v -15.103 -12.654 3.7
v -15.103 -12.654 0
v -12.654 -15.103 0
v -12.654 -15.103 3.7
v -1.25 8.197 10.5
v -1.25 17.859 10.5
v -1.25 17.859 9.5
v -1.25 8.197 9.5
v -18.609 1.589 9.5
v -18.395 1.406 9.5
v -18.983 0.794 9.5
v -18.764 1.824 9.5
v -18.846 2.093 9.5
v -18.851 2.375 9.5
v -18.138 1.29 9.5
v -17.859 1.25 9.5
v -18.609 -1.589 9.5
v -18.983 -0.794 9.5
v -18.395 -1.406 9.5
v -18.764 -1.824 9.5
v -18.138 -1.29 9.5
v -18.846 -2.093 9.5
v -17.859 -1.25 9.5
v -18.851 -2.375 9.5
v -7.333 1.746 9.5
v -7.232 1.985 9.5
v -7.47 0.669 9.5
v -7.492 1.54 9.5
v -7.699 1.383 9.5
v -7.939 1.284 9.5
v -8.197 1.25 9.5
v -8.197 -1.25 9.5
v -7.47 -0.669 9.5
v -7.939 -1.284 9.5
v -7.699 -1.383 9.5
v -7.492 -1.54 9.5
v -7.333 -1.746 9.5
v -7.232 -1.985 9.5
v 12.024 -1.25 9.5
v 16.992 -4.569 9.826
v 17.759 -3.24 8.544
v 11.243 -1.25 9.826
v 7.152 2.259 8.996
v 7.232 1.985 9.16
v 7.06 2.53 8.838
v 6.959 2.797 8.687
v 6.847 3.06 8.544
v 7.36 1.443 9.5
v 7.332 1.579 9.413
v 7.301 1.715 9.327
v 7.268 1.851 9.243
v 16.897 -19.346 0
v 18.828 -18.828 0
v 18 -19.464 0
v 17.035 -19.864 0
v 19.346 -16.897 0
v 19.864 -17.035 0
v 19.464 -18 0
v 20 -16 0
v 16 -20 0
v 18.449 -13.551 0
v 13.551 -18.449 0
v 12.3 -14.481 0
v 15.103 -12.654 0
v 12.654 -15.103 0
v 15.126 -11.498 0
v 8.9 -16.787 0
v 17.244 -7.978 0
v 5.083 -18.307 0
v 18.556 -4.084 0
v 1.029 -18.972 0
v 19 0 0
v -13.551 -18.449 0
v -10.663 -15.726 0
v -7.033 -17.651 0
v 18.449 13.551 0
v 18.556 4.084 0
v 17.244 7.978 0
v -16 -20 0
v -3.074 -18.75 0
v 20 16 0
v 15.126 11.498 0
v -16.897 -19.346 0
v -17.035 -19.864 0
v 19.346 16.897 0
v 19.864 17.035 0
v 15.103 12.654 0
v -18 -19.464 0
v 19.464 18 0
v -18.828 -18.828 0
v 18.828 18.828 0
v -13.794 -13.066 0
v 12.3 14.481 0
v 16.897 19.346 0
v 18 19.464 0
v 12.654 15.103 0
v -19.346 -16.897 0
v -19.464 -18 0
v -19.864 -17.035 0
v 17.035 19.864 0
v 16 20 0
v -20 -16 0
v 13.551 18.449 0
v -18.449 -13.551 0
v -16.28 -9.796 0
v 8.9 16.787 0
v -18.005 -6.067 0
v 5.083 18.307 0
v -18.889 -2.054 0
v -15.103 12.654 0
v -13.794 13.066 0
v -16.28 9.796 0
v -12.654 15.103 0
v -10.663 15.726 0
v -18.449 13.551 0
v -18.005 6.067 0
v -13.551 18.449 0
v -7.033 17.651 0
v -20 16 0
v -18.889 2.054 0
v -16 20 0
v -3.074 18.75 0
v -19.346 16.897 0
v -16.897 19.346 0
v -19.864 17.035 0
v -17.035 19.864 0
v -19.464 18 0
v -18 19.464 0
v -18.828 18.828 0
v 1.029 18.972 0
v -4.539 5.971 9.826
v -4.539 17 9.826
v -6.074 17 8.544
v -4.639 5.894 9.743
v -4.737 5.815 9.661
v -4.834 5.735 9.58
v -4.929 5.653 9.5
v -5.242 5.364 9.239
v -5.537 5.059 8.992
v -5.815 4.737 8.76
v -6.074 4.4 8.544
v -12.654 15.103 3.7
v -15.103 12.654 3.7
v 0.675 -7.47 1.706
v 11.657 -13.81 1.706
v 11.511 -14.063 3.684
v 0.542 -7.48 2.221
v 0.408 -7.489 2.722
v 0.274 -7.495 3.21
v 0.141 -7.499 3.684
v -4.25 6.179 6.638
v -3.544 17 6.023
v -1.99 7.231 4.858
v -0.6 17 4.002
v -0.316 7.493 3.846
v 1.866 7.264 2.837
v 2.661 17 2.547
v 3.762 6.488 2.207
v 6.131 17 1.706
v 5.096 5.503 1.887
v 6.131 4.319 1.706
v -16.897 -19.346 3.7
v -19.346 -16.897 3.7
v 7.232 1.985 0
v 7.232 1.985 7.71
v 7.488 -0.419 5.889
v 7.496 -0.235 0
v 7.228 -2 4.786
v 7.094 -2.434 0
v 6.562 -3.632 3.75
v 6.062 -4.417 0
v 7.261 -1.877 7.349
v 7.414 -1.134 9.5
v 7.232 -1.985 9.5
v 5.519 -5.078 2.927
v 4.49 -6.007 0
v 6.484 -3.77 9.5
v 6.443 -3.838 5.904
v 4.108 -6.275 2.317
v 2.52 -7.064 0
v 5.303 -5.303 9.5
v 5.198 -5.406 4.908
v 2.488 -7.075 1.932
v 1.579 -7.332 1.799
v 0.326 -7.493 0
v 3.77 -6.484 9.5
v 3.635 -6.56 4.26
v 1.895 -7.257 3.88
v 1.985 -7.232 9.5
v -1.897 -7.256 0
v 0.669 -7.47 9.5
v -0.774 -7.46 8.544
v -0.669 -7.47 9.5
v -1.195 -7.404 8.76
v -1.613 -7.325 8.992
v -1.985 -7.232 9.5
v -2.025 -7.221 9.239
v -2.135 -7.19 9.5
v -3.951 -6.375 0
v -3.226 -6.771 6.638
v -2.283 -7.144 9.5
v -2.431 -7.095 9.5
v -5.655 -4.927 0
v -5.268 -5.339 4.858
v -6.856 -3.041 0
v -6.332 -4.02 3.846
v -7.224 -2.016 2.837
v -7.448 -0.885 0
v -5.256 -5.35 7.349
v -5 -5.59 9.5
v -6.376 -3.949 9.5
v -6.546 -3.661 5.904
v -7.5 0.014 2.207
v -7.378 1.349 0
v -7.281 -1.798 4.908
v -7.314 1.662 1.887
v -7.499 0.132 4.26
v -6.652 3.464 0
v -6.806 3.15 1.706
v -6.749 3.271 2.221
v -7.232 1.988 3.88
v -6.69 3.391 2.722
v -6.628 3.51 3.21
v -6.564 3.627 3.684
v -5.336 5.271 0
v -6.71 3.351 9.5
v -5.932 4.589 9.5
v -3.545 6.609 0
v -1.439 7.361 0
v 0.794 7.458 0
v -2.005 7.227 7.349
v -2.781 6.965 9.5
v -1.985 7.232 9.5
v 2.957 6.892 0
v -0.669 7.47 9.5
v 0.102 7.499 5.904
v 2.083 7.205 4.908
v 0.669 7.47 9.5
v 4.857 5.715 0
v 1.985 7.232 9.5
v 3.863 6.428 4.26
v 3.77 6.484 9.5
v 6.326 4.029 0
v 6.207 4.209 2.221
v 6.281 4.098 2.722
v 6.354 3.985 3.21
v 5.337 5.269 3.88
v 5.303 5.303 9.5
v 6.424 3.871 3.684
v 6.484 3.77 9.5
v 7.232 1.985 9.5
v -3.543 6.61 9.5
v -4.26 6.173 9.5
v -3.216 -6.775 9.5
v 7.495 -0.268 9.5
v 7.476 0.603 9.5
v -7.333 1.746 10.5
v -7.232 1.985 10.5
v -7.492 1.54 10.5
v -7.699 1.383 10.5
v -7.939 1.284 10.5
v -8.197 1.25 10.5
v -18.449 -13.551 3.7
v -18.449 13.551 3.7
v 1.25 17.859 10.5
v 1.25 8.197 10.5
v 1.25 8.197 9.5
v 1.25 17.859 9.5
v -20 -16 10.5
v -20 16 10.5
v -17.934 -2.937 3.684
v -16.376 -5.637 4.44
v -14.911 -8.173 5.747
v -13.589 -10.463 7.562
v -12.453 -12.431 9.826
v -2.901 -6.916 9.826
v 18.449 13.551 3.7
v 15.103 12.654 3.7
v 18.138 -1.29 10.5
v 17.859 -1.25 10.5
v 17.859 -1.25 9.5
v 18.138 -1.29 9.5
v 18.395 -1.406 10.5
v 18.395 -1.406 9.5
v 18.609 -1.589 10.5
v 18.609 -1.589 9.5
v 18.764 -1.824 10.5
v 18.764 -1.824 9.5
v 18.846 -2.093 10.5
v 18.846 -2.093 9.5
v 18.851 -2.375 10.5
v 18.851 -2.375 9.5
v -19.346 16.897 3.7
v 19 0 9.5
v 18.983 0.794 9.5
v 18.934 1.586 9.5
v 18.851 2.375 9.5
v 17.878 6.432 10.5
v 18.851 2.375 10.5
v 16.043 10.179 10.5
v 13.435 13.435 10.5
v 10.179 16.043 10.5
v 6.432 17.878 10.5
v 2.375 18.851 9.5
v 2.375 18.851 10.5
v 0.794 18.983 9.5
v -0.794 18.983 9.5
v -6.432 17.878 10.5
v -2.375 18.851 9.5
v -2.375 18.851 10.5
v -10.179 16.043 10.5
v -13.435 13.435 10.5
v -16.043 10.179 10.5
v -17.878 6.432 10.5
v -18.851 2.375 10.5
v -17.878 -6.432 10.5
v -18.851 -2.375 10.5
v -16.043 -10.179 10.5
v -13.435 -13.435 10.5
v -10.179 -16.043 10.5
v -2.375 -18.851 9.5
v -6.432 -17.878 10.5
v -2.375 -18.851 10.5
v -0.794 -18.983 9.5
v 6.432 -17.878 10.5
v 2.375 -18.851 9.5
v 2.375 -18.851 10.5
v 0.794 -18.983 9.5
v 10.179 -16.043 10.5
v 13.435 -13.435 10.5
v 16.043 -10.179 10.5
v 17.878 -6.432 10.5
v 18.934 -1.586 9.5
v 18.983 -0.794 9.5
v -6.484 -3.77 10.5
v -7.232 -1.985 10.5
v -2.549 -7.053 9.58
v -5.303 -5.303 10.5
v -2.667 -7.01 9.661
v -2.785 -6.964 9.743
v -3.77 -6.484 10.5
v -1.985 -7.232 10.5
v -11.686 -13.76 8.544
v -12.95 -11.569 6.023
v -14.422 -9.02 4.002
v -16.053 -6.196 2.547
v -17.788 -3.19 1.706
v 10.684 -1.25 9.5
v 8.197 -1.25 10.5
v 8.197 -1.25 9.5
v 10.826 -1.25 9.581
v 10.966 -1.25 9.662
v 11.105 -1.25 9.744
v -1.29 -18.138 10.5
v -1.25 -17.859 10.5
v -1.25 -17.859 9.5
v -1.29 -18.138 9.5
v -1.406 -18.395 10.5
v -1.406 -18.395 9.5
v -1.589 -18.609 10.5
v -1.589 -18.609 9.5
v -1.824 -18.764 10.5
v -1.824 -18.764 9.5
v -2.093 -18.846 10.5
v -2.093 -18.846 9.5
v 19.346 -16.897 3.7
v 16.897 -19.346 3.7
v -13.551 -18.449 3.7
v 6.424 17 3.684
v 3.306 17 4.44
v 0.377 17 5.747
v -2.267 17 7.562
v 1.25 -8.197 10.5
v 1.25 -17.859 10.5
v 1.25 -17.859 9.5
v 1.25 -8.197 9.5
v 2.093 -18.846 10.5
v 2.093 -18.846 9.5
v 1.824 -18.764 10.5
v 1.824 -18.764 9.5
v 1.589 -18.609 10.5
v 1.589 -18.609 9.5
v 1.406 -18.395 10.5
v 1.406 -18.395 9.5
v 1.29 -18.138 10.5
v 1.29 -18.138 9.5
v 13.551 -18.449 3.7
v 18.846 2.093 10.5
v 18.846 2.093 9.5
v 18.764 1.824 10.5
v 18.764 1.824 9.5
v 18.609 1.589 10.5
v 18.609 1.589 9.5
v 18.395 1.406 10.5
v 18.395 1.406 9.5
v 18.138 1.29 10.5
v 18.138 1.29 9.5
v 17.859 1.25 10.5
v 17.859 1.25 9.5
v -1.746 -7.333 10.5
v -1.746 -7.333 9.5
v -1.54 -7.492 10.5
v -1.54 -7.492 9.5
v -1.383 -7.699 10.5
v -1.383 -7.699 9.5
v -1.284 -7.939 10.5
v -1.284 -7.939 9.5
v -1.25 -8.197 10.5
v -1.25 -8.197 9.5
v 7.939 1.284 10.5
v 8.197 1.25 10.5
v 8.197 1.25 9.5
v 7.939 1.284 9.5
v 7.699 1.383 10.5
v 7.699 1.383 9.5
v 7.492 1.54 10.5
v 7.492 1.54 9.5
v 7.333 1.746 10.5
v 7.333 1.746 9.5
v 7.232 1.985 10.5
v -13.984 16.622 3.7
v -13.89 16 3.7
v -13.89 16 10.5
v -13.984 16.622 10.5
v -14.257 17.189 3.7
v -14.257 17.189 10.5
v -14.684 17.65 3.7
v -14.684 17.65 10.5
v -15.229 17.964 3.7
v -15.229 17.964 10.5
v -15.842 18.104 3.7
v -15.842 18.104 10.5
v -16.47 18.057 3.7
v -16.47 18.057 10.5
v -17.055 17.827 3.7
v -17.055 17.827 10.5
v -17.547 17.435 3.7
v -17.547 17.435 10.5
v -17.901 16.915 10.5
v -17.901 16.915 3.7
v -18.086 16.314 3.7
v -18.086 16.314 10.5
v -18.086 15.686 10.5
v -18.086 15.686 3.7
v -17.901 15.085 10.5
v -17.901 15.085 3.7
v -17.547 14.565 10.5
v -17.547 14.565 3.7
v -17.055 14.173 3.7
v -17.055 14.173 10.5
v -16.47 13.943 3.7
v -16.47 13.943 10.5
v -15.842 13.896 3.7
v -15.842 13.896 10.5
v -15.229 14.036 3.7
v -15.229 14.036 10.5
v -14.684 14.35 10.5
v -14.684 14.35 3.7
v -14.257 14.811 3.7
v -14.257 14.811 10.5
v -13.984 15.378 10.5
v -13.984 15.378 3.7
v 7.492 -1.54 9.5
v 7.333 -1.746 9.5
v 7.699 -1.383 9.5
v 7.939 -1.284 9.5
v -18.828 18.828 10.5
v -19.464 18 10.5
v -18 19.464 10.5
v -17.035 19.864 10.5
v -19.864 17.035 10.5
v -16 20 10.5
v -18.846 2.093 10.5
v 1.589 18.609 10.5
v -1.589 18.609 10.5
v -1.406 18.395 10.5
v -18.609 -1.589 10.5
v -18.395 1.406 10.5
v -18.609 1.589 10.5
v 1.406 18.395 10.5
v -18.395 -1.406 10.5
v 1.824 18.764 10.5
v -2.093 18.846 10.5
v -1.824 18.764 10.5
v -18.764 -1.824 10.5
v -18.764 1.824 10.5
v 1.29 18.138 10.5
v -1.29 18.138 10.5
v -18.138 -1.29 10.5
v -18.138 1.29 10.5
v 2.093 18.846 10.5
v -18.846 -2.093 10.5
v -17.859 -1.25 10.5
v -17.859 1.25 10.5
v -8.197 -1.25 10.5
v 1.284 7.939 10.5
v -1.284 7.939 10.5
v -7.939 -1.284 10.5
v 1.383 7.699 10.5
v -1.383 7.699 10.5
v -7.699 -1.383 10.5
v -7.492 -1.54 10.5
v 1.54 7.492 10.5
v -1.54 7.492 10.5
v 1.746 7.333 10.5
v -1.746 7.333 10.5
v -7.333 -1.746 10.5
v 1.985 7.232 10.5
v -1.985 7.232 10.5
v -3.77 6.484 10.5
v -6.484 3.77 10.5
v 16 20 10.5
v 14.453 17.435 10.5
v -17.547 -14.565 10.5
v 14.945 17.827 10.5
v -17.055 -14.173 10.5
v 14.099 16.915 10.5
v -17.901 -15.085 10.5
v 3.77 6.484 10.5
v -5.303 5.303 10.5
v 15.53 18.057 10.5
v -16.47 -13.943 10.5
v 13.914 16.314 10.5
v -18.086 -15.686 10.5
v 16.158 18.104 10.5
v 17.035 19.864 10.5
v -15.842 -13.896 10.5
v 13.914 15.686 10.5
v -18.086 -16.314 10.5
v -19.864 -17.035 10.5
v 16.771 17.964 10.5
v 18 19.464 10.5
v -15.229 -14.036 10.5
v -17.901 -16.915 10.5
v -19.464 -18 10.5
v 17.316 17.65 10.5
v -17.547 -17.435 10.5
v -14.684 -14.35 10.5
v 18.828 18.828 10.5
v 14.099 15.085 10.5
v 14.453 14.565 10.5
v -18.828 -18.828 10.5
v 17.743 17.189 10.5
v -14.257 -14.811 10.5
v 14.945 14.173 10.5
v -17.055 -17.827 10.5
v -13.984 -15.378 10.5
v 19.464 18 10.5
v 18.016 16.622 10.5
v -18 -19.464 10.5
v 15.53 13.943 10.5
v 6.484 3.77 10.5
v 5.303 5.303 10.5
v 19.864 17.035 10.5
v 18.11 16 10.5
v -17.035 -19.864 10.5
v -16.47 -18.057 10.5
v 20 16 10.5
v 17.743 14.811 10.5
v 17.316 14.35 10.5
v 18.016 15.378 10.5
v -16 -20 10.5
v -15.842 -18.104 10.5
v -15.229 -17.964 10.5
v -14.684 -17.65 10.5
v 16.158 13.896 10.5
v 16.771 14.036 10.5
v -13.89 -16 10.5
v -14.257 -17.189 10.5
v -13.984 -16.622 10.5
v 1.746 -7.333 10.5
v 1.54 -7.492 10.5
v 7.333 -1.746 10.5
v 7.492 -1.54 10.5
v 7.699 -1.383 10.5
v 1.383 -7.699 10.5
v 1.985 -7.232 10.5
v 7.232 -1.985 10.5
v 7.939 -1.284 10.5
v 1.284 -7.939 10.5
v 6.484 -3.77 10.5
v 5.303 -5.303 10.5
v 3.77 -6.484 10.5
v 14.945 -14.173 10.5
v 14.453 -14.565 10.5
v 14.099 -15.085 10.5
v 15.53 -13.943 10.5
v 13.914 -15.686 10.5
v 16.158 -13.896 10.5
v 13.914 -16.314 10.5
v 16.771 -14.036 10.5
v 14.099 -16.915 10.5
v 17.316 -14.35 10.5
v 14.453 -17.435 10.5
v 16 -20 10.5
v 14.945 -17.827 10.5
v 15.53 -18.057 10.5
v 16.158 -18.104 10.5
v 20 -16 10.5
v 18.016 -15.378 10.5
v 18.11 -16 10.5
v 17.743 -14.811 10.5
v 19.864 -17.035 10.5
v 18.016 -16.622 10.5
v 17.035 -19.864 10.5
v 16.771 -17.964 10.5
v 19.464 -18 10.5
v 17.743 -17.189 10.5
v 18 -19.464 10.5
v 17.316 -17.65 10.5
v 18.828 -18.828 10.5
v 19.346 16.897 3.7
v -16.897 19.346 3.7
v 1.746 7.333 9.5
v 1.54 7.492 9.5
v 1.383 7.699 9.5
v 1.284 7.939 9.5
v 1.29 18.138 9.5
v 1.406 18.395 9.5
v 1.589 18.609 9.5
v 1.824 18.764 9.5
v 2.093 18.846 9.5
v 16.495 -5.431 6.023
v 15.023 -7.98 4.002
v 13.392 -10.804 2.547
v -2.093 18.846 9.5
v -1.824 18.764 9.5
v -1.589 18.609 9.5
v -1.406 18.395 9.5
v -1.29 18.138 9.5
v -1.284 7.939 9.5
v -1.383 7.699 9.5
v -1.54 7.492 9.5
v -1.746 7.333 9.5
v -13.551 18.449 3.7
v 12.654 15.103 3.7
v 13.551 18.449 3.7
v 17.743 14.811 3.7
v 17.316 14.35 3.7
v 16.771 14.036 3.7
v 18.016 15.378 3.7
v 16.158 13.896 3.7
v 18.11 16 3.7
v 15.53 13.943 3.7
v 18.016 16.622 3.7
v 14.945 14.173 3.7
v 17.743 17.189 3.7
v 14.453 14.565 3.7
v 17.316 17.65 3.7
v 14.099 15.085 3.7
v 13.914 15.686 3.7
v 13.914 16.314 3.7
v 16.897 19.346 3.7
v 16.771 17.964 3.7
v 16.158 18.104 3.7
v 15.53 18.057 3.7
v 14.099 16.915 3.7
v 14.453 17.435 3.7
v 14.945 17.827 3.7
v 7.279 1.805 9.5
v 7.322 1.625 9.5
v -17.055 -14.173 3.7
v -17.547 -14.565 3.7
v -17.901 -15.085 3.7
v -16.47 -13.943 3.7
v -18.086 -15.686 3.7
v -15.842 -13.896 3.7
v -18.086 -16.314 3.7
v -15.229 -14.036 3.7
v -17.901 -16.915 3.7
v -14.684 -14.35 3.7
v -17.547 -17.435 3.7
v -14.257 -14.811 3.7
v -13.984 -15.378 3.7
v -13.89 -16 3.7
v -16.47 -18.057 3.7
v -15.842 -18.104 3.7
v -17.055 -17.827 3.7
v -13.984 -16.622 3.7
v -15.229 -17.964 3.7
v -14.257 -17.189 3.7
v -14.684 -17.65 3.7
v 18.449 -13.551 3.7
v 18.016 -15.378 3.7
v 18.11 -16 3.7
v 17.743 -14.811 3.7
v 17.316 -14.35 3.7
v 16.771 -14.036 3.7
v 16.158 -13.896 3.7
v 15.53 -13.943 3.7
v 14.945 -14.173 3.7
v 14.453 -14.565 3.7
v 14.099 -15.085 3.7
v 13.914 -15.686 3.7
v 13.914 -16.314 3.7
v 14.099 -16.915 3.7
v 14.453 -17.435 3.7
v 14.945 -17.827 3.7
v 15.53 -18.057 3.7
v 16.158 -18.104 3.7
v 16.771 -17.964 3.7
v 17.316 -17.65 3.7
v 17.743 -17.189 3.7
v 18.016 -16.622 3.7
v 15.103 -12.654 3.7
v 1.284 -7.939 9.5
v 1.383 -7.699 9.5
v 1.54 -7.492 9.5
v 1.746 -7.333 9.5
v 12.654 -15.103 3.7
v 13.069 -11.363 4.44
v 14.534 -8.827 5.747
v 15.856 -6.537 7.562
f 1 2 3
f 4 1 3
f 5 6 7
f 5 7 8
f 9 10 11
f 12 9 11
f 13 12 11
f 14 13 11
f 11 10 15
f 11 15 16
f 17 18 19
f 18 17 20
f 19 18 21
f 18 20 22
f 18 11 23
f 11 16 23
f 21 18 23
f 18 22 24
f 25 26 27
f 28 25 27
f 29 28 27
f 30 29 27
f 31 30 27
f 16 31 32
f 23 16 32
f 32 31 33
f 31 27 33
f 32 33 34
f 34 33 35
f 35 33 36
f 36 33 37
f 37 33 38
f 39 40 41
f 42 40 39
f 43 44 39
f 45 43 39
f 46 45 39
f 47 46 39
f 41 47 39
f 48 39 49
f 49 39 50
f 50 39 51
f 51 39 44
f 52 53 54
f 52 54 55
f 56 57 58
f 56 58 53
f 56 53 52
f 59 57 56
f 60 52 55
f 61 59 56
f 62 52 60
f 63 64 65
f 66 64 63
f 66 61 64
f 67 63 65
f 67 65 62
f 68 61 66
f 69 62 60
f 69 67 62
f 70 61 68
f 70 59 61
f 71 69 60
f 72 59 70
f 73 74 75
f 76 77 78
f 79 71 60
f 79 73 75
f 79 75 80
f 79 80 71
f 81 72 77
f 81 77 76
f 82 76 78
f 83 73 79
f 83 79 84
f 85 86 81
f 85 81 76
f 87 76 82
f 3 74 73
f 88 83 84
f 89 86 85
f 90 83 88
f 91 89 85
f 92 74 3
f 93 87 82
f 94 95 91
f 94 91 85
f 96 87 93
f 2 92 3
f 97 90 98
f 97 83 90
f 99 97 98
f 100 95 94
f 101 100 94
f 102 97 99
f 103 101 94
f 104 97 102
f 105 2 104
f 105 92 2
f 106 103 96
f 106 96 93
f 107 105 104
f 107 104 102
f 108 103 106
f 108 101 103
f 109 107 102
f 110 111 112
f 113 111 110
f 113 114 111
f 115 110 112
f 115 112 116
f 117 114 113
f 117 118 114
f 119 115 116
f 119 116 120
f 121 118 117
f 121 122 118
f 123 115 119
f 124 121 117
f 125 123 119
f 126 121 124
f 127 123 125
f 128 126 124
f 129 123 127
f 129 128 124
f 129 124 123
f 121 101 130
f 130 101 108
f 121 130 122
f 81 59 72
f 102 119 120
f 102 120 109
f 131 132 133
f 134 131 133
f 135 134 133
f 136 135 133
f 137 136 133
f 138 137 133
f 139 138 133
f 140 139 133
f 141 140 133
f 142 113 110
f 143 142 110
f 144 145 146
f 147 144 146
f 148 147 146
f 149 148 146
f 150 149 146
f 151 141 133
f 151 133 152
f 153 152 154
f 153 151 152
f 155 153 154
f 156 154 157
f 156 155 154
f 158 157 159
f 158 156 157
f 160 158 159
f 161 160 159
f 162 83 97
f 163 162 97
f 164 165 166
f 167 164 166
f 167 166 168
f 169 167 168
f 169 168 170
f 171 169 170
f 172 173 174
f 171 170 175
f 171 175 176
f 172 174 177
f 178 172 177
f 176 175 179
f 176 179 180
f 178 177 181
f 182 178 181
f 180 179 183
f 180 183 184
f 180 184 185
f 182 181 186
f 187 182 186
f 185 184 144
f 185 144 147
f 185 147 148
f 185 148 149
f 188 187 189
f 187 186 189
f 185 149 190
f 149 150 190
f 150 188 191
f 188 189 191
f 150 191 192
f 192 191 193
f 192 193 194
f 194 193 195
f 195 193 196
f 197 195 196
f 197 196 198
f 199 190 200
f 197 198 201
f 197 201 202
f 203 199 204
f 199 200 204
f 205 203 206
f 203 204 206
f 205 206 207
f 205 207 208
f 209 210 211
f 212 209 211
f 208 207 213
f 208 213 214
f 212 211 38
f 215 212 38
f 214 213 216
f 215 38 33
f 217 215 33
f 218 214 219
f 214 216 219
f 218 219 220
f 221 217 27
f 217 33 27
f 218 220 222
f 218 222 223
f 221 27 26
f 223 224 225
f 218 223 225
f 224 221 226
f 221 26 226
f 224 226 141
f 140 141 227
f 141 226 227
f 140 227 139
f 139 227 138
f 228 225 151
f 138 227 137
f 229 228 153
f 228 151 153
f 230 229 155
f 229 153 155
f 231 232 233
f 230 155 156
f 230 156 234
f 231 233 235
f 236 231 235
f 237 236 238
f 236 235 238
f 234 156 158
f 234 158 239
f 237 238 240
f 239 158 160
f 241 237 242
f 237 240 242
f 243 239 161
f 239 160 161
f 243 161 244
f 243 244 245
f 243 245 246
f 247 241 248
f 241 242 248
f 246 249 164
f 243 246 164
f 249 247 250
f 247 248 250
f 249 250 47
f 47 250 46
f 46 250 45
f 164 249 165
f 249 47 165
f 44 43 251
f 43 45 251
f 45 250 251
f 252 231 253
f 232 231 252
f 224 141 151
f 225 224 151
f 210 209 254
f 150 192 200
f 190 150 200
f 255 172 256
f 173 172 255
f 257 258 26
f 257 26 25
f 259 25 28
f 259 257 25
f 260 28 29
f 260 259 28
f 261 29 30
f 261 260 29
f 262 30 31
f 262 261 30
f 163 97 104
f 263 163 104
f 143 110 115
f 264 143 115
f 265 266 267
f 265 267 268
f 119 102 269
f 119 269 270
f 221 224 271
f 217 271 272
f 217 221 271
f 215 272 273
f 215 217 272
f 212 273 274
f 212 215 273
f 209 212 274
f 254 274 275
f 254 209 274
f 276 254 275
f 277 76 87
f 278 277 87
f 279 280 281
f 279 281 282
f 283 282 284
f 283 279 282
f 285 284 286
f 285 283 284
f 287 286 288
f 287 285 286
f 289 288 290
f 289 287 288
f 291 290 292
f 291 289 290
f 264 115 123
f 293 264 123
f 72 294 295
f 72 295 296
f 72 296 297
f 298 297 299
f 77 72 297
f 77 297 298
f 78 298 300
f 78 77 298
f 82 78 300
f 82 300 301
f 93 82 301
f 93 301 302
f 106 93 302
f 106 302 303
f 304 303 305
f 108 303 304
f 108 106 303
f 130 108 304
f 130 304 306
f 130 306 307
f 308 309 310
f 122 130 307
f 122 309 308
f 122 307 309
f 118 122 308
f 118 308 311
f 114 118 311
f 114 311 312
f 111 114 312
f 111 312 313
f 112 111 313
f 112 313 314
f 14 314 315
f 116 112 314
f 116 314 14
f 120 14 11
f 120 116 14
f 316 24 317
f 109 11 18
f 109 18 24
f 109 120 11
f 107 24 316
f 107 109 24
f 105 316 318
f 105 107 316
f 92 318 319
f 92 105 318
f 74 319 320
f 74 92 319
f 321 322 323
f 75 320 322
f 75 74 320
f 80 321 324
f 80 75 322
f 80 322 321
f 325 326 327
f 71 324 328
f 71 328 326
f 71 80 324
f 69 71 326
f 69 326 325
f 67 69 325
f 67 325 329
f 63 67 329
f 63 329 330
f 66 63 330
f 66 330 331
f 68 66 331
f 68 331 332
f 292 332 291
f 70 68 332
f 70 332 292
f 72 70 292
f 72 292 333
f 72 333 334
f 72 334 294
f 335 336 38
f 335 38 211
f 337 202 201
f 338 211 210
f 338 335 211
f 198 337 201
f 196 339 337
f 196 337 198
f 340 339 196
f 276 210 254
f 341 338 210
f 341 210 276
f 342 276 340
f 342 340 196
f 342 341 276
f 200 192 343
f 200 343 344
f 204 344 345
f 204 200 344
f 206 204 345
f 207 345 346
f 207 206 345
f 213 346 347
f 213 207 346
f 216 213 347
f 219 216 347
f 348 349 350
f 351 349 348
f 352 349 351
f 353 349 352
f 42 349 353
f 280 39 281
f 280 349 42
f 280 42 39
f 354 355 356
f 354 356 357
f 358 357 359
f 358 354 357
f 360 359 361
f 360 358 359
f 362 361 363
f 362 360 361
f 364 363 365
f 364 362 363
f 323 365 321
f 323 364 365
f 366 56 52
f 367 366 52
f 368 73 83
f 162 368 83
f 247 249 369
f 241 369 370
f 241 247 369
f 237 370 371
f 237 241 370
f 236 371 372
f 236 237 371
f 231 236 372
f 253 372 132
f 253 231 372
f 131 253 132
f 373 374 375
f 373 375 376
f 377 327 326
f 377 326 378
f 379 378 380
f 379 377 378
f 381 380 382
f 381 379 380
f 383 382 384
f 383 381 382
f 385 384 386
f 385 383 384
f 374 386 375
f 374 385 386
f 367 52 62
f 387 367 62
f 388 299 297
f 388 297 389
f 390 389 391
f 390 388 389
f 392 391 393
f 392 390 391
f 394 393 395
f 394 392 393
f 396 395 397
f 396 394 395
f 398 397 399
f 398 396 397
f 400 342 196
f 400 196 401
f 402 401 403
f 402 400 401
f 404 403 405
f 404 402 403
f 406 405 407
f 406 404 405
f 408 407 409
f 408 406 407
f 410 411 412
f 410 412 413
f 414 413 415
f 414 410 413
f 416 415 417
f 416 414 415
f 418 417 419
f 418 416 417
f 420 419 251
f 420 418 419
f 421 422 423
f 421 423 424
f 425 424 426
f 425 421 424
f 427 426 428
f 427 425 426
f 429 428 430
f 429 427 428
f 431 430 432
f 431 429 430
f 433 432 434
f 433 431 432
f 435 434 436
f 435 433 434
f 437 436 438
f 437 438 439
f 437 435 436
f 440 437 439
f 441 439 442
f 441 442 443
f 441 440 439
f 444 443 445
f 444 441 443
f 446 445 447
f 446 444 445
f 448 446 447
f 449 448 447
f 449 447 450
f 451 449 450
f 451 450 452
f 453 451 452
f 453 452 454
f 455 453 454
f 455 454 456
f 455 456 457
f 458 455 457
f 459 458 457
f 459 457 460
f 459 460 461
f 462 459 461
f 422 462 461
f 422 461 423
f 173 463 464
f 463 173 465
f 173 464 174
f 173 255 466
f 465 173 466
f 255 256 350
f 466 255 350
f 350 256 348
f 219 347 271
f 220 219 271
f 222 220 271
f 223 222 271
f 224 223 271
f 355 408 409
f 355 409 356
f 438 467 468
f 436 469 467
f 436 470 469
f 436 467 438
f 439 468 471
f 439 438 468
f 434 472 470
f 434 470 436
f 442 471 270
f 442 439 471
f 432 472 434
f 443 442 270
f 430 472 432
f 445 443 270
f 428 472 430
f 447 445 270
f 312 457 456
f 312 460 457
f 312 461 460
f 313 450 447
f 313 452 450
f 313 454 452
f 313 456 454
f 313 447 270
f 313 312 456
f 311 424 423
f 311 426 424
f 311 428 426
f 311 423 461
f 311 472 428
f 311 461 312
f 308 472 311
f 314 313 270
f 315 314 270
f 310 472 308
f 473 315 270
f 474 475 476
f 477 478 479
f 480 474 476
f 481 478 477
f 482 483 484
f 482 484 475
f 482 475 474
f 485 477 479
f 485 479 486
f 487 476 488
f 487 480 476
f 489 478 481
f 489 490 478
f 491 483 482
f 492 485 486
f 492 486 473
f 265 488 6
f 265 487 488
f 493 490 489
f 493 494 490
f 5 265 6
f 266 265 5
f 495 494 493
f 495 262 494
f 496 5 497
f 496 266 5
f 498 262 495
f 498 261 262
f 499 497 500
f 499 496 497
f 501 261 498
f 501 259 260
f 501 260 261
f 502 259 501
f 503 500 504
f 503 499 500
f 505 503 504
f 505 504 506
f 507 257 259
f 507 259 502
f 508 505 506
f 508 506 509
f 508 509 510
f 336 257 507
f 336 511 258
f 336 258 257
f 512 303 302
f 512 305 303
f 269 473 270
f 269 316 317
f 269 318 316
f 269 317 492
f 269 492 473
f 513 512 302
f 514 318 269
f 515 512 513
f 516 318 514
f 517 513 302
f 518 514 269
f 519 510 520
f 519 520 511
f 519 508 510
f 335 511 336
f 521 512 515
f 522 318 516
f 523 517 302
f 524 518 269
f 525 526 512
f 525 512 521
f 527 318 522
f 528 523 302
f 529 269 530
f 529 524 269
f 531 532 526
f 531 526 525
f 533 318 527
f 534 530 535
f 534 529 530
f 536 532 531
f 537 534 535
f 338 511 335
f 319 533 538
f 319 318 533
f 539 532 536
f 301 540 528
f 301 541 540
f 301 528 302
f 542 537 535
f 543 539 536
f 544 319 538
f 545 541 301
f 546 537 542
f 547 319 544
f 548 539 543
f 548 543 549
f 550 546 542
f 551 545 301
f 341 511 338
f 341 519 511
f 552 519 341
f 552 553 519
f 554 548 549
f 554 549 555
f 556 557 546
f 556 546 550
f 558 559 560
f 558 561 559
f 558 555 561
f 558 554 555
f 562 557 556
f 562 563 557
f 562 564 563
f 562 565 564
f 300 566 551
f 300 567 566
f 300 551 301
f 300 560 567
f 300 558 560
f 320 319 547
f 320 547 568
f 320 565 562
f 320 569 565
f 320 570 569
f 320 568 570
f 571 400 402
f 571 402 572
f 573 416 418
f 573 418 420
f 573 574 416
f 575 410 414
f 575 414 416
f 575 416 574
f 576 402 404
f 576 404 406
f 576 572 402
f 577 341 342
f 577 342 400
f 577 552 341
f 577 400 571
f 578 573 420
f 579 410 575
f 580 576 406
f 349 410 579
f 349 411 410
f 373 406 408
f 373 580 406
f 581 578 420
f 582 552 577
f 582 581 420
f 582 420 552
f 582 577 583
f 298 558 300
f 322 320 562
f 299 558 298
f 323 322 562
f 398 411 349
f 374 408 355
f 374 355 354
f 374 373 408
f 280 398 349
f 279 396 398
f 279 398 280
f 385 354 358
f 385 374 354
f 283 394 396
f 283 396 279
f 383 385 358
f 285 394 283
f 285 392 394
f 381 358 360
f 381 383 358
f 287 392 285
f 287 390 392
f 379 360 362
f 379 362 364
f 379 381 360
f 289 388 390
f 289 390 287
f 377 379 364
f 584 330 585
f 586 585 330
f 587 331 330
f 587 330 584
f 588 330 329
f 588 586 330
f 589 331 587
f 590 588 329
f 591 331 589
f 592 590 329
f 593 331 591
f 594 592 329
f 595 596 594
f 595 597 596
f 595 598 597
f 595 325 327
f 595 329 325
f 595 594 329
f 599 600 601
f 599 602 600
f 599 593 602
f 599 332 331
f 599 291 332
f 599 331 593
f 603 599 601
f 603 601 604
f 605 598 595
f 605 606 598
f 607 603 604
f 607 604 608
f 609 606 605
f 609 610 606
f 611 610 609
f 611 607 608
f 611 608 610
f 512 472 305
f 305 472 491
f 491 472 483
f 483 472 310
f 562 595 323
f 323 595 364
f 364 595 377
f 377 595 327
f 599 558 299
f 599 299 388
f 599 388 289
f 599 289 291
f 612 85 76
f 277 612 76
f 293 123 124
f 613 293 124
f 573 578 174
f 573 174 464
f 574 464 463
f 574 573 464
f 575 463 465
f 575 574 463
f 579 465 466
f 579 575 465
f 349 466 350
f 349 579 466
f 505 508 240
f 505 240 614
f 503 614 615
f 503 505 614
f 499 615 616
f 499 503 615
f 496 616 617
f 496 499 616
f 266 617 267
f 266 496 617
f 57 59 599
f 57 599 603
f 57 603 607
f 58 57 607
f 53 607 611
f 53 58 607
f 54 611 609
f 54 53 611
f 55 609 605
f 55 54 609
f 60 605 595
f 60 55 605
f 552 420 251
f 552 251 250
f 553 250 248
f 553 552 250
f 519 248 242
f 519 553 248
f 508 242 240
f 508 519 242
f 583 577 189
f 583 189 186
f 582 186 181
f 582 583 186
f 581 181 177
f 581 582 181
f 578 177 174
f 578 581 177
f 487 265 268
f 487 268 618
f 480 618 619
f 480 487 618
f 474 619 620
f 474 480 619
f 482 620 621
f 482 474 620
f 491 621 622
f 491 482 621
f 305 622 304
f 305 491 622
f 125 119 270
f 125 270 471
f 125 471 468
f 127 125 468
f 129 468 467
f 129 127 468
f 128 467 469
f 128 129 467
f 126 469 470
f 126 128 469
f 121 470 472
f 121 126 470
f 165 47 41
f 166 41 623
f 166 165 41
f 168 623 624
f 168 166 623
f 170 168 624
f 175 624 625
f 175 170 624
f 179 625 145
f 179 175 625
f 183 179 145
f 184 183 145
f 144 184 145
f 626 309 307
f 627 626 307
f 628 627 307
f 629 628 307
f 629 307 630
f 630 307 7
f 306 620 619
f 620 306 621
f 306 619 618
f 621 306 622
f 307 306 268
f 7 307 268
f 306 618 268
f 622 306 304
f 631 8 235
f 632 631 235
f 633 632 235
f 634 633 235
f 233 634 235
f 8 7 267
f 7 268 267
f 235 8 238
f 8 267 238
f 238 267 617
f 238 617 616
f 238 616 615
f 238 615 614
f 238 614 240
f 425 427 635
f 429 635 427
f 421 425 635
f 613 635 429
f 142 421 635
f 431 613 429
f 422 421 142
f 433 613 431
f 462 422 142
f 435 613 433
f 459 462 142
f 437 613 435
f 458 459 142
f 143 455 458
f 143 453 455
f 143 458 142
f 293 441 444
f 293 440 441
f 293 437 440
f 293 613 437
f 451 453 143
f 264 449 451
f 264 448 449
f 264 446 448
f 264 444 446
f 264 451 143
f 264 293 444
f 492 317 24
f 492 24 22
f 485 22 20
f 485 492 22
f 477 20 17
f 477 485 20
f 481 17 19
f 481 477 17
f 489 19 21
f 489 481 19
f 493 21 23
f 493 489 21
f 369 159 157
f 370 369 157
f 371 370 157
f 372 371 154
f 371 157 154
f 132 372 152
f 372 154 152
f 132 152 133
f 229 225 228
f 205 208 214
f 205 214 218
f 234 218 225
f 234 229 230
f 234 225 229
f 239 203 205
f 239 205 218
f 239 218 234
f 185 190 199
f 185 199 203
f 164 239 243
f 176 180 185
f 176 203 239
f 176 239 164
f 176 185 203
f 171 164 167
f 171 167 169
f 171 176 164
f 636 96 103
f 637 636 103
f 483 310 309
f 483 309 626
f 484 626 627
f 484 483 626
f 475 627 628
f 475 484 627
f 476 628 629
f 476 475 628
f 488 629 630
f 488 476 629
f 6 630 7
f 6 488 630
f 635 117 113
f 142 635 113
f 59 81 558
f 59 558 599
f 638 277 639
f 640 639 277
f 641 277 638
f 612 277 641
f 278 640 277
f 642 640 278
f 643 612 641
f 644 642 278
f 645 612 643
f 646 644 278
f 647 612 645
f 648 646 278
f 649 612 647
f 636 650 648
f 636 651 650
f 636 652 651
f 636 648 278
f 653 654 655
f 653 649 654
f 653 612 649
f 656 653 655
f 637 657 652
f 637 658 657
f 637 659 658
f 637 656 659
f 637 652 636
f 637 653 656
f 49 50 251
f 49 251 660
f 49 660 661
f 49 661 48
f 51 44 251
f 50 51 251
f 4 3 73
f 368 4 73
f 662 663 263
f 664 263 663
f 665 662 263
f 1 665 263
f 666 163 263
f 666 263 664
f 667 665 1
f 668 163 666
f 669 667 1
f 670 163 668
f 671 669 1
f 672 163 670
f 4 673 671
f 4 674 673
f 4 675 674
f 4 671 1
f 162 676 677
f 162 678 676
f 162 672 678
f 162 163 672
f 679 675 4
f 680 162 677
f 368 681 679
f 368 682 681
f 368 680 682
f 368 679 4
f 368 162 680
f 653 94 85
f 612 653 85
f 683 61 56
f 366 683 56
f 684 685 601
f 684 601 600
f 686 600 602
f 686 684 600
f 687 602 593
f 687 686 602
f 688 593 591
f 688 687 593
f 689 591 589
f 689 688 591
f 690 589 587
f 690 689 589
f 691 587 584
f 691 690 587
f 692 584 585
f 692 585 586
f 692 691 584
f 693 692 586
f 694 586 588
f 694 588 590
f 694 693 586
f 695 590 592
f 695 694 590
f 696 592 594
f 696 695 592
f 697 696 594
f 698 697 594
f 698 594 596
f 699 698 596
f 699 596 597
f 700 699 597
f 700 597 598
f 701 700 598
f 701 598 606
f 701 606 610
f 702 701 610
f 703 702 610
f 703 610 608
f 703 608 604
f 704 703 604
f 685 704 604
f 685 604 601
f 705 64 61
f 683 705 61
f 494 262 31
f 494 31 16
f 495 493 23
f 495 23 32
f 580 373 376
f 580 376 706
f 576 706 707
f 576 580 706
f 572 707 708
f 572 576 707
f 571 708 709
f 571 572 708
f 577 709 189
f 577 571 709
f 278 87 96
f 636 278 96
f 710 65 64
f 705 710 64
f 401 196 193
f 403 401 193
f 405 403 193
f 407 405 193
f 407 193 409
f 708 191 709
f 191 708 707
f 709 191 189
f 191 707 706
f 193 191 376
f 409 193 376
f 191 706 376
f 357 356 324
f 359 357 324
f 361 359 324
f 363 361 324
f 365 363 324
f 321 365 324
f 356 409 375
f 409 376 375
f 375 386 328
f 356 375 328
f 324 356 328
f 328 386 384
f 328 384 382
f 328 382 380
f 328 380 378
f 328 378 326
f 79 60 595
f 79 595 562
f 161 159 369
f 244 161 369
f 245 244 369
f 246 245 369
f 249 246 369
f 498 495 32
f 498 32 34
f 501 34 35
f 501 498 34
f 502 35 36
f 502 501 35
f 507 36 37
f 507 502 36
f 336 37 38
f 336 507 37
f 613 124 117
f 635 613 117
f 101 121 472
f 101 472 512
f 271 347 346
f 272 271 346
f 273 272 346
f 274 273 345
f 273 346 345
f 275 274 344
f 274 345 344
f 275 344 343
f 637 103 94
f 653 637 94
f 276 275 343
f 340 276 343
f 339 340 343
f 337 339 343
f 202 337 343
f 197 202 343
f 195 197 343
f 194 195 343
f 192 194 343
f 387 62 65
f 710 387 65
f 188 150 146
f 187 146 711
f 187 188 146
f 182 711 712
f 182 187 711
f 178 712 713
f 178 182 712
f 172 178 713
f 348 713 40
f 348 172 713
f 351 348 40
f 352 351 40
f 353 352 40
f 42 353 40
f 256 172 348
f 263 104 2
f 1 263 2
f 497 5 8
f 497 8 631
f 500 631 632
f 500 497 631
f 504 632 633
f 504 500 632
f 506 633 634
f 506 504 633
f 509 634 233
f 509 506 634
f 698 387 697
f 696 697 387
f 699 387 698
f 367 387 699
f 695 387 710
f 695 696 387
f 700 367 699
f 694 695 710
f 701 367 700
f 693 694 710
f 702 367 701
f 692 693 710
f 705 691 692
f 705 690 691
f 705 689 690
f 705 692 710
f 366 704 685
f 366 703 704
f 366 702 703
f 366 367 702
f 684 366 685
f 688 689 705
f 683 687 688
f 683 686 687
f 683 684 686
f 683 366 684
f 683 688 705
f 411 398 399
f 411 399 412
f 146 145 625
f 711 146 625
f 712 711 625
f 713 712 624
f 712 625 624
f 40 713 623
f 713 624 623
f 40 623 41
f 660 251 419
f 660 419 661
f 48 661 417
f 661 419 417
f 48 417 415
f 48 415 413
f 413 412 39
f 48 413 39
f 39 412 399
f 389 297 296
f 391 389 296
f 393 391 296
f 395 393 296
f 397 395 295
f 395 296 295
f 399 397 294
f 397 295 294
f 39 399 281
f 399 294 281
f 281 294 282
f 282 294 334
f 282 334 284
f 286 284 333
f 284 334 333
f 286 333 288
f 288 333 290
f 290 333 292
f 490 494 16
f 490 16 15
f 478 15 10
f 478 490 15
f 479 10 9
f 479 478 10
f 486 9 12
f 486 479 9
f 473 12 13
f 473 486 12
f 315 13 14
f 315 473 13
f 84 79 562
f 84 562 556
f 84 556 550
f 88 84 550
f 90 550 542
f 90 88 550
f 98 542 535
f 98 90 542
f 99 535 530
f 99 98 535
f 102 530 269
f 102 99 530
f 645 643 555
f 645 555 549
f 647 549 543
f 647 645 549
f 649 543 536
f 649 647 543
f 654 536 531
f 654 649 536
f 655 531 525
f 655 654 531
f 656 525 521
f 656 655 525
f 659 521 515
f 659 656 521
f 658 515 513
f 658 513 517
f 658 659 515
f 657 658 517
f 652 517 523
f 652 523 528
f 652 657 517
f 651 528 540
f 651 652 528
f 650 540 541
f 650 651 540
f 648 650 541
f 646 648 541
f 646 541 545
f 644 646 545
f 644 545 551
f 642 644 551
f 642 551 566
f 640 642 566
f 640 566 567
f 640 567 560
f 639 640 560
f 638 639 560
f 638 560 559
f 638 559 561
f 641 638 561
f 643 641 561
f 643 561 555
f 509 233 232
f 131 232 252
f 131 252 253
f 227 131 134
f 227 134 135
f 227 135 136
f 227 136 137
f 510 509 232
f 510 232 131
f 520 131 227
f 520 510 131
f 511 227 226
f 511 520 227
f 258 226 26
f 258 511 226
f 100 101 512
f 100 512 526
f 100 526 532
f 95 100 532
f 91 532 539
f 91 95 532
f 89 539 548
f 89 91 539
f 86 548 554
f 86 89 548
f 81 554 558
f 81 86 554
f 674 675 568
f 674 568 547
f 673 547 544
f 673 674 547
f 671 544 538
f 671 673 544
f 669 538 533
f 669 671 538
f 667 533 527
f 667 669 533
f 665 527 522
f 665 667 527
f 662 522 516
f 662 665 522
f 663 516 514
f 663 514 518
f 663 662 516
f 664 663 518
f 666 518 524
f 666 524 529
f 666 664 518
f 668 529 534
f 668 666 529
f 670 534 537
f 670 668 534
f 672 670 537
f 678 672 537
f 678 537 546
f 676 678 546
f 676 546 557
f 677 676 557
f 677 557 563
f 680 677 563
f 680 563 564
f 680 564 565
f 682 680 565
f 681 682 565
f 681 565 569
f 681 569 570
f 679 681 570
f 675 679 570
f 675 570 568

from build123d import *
from build123d.topology import SkipClean

# Parameters (mm, degrees)
SKETCH1_R           = 19
SKETCH1_R_2         = 2.11
BOSS_EXTRUDE1_DEPTH = 10.5
BOSS_EXTRUDE2_DEPTH = 1
CIRPATTERN1_COUNT   = 4
SKETCH4_R           = 7.5
BOSS_EXTRUDE3_DEPTH = 9.5
EXTRUDE_THIN1_DEPTH = 17
CIRPATTERN2_COUNT   = 3
CUT_EXTRUDE1_DEPTH  = 3.7
CIRPATTERN3_COUNT   = 4


with BuildPart() as part:
    # Sketch1 → Boss-Extrude1 (new body)
    with BuildSketch(Plane.XY):
        with BuildLine():
            Line((-16, 20), (16, 20))
            ThreePointArc((16, 20), (18.828427125, 18.828427125), (20, 16))
            Line((20, 16), (20, -16))
            ThreePointArc((20, -16), (18.828427125, -18.828427125), (16, -20))
            Line((16, -20), (-16, -20))
            ThreePointArc((-16, -20), (-18.828427125, -18.828427125), (-20, -16))
            Line((-20, -16), (-20, 16))
            ThreePointArc((-20, 16), (-18.828427125, 18.828427125), (-16, 20))
        make_face()
        Circle(SKETCH1_R, mode=Mode.SUBTRACT)
        with Locations((-16, 16)):
            Circle(SKETCH1_R_2, mode=Mode.SUBTRACT)
        with Locations((-16, -16)):
            Circle(SKETCH1_R_2, mode=Mode.SUBTRACT)
        with Locations((16, -16)):
            Circle(SKETCH1_R_2, mode=Mode.SUBTRACT)
        with Locations((16, 16)):
            Circle(SKETCH1_R_2, mode=Mode.SUBTRACT)
    extrude(amount=BOSS_EXTRUDE1_DEPTH)

    # Sketch2 → Boss-Extrude2 (add)
    with BuildSketch(Plane.XY.offset(10.5)):
        with BuildLine():
            Line((-1.25, 17.85882135), (-1.25, 8.196798155))
            ThreePointArc((-1.25, 8.196798155), (-1.454793774, 7.590459093), (-1.985294118, 7.232468961))
            ThreePointArc((-1.985294118, 7.232468961), (0, -7.5), (1.985294118, 7.232468961))
            ThreePointArc((1.985294118, 7.232468961), (1.454793774, 7.590459093), (1.25, 8.196798155))
            Line((1.25, 8.196798155), (1.25, 17.85882135))
            ThreePointArc((1.25, 17.85882135), (1.588562172, 18.60882135), (2.375, 18.850978091))
            ThreePointArc((2.375, 18.850978091), (0, 19), (-2.375, 18.850978091))
            ThreePointArc((-2.375, 18.850978091), (-1.588562172, 18.60882135), (-1.25, 17.85882135))
        make_face()
    boss_extrude2 = extrude(amount=-BOSS_EXTRUDE2_DEPTH)

    # CirPattern1: Boss-Extrude2 ×4 about axis
    cirpattern1_axis = Axis((0, 0, 0), (0, 0, 1))
    for i in range(1, CIRPATTERN1_COUNT):
        add(boss_extrude2.rotate(cirpattern1_axis, i * 360 / CIRPATTERN1_COUNT))

    # Sketch4 → Boss-Extrude3 (add)
    with SkipClean():  # keep this step's faces unmerged: merging them makes the solid invalid here
        with BuildSketch(Plane(origin=(0, 0, 9.5), x_dir=(-1, 0, 0), z_dir=(0, 0, -1))):
            with Locations(Location((0, 0, 0), (0, 0, 164.650522983))):  # turned: the seam where the file's is
                Circle(SKETCH4_R)
        extrude(amount=BOSS_EXTRUDE3_DEPTH)

    # Sketch5 → Extrude-Thin1 (add)
    with SkipClean():  # keep this step's faces unmerged: merging them makes the solid invalid here
        with BuildSketch(Plane(origin=(0, 0, 0), x_dir=(1, 0, 0), z_dir=(0, 1, 0))):
            with BuildLine():
                ThreePointArc((-6.073641938, -8.543547558), (-0.600270019, -4.001821599), (6.131264125, -1.705841866))
                Line((6.131264125, -1.705841866), (6.423685209, -3.684348857))
                ThreePointArc((6.423685209, -3.684348857), (0.377258659, -5.746653305), (-4.539056193, -9.826141254))
                Line((-4.539056193, -9.826141254), (-6.073641938, -8.543547558))
            make_face()
        extrude_thin1 = extrude(amount=EXTRUDE_THIN1_DEPTH)

    # CirPattern2: Extrude-Thin1 ×3 about axis
    with SkipClean():  # keep this step's faces unmerged: merging them makes the solid invalid here
        cirpattern2_axis = Axis((0, 0, 0), (0, 0, 1))
        for i in range(1, CIRPATTERN2_COUNT):
            add(extrude_thin1.rotate(cirpattern2_axis, i * 360 / CIRPATTERN2_COUNT))

    # Sketch6 → Cut-Extrude1 (cut)
    with SkipClean():  # keep this step's faces unmerged: merging them makes the solid invalid here
        with BuildSketch(Plane(origin=(0, 0, 0), x_dir=(-1, 0, 0), z_dir=(0, 0, -1))):
            Polygon((-16.896575472, 19.346065215), (-19.346065215, 16.896575472), (-18.449489743, 13.550510257), (-15.103424528, 12.653934785), (-12.653934785, 15.103424528), (-13.550510257, 18.449489743), align=None)
        cut_extrude1 = extrude(amount=-CUT_EXTRUDE1_DEPTH, mode=Mode.SUBTRACT)

    # CirPattern3: Cut-Extrude1 ×4 about axis
    with SkipClean():  # keep this step's faces unmerged: merging them makes the solid invalid here
        cirpattern3_axis = Axis((0, 0, 0), (0, 0, 1))
        for i in range(1, CIRPATTERN3_COUNT):
            add(cut_extrude1.rotate(cirpattern3_axis, i * 360 / CIRPATTERN3_COUNT), mode=Mode.SUBTRACT)


solid = part.part
